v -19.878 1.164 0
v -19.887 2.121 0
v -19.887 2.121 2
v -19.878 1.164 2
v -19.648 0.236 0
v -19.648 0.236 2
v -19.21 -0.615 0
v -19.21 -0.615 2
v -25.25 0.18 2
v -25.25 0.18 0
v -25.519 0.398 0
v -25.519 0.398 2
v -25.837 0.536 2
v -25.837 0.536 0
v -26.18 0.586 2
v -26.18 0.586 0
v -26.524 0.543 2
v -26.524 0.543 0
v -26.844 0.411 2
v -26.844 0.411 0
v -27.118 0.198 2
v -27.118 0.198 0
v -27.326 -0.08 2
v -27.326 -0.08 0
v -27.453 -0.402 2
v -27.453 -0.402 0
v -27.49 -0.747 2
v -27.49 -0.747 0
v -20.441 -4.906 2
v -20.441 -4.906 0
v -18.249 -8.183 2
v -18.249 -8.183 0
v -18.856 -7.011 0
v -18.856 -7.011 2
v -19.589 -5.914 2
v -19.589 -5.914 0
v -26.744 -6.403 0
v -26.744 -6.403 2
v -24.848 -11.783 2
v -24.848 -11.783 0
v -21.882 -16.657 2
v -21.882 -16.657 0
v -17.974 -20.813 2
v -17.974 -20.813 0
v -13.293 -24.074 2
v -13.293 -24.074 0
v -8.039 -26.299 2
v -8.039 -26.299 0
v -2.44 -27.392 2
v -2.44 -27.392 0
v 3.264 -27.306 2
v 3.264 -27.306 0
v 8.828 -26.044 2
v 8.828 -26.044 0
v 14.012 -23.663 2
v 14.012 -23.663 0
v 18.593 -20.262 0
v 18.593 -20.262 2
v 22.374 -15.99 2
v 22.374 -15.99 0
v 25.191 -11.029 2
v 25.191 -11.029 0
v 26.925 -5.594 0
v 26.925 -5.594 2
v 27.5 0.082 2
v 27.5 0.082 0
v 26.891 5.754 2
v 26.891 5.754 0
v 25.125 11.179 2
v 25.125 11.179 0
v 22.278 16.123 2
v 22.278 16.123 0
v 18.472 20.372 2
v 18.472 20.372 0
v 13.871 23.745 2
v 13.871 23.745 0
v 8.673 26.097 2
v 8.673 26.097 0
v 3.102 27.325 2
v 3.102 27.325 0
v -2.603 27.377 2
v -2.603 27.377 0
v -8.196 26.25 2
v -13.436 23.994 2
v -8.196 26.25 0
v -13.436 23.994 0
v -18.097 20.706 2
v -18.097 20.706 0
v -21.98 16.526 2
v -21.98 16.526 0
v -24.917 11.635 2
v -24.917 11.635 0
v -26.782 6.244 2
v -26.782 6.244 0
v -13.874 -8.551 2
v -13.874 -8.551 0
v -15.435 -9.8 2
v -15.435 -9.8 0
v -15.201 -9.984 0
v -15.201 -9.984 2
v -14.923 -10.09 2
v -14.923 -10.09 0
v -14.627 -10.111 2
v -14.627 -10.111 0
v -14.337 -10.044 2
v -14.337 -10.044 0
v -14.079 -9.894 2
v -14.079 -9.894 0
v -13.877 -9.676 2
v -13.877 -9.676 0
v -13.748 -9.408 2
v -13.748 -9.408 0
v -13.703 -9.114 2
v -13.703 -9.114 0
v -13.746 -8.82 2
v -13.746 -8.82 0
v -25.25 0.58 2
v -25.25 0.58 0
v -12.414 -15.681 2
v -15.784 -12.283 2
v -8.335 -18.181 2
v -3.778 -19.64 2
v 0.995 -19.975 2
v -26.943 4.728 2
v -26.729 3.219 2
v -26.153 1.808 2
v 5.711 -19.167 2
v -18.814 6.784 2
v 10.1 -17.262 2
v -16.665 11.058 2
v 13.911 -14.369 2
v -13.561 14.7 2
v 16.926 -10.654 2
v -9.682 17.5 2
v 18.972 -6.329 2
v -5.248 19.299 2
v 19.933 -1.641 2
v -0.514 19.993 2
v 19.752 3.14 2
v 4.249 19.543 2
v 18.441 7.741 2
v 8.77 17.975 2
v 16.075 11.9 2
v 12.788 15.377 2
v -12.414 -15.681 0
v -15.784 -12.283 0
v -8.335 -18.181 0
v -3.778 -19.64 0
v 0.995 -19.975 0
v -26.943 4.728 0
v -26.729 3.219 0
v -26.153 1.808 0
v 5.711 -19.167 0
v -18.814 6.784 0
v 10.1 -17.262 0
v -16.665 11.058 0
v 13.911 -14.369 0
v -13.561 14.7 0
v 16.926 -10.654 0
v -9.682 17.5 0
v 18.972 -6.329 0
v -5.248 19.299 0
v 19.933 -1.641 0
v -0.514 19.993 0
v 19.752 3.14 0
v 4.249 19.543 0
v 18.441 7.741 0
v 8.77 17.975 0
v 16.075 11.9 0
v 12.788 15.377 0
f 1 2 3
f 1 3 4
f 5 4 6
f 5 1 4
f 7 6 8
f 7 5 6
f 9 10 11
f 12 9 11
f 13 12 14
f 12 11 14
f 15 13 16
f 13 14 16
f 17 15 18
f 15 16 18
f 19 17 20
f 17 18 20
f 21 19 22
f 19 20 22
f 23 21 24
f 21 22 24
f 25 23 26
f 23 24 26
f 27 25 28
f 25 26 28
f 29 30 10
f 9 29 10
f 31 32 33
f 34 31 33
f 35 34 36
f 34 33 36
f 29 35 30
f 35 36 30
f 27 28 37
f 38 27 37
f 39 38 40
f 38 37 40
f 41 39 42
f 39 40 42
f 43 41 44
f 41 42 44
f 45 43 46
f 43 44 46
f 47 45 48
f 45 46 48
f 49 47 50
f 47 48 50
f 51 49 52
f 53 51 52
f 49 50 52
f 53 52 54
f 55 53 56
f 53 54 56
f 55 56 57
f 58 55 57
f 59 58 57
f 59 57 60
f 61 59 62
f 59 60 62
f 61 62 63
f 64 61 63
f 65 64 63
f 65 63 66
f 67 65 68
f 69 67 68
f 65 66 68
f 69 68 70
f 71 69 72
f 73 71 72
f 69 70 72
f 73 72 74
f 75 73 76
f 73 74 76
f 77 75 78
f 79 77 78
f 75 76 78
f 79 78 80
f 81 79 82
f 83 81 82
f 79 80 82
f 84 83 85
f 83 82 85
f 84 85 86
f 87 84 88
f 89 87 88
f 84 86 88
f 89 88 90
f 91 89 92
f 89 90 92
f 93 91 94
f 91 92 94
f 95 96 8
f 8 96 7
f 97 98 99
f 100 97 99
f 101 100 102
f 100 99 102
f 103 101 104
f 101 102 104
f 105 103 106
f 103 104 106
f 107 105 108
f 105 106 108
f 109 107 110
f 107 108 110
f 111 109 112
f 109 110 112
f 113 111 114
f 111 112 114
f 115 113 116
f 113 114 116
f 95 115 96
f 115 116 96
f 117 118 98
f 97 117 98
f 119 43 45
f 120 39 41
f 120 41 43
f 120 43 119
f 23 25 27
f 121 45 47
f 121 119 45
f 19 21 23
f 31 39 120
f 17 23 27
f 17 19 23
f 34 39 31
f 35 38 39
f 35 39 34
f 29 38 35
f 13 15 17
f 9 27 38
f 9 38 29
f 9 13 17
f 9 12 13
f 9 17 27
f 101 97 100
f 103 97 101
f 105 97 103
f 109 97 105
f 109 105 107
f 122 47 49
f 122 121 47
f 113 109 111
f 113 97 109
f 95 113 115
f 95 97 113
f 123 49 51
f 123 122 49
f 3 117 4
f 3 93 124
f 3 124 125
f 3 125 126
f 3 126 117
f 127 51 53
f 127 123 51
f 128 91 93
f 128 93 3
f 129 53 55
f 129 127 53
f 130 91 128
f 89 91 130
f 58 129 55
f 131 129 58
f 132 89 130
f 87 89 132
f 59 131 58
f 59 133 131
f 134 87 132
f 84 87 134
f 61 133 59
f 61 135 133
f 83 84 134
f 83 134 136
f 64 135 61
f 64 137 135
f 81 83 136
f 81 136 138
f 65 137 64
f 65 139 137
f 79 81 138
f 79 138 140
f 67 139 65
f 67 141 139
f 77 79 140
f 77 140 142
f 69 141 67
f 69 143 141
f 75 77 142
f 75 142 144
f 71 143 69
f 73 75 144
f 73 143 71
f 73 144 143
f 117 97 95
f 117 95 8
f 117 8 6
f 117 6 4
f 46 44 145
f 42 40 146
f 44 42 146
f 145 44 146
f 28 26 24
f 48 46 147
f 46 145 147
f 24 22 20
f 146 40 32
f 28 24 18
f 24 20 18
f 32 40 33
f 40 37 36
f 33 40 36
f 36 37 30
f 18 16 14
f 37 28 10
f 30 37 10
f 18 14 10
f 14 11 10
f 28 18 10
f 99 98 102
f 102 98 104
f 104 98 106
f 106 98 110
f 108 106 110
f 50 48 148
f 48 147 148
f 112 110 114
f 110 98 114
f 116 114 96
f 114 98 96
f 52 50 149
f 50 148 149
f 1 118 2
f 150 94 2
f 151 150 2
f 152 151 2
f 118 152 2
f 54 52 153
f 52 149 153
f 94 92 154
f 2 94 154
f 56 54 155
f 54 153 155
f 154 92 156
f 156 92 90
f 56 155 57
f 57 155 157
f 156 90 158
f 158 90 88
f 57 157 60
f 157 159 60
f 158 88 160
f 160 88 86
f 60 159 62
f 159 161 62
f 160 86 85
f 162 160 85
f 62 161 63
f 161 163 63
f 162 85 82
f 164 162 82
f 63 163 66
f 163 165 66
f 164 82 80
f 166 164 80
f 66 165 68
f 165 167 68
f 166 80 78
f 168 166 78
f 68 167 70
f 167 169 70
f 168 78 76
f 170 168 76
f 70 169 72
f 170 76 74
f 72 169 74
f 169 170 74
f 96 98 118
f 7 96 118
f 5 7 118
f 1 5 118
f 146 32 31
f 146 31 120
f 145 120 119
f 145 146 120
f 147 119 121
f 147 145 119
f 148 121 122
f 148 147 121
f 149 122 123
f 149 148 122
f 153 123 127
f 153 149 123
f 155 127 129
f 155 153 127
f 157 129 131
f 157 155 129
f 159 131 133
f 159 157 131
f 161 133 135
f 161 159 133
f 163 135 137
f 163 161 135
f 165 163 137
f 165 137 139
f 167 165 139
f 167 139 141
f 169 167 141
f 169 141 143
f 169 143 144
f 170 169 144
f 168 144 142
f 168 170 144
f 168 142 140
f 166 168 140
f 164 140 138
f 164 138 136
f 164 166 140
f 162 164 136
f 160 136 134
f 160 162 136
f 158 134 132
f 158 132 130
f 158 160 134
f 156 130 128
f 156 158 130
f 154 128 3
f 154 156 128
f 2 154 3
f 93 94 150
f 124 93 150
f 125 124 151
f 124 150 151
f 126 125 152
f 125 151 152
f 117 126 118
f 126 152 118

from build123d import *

# Parameters (mm, degrees)
PAD_DEPTH = 2


with BuildPart() as part:
    # Sketch → Pad (new body)
    with BuildSketch(Plane.XY):
        with BuildLine():
            ThreePointArc((-27.489858, -0.746794), (27.360019, -2.771163), (-26.781824, 6.243707))
            ThreePointArc((-26.781824, 6.243707), (-26.728683, 3.219003), (-25.249794, 0.579962))
            Line((-25.249794, 0.579962), (-15.435404, -9.800129))
            ThreePointArc((-15.435404, -9.800129), (-14.079498, -9.894335), (-13.873578, -8.55085))
            Line((-13.873578, -8.55085), (-19.209537, -0.614914))
            ThreePointArc((-19.887258, 2.120607), (-19.789586, 0.693092), (-19.209537, -0.614914))
            ThreePointArc((-18.249364, -8.182952), (19.751995, 3.139854), (-19.887258, 2.120607))
            ThreePointArc((-18.249364, -8.182952), (-19.207091, -6.452486), (-20.440588, -4.906446))
            Line((-20.440588, -4.906446), (-25.249794, 0.179962))
            ThreePointArc((-25.249794, 0.179962), (-26.688775, 0.487518), (-27.489858, -0.746794))
        make_face()
    extrude(amount=PAD_DEPTH)


solid = part.part
